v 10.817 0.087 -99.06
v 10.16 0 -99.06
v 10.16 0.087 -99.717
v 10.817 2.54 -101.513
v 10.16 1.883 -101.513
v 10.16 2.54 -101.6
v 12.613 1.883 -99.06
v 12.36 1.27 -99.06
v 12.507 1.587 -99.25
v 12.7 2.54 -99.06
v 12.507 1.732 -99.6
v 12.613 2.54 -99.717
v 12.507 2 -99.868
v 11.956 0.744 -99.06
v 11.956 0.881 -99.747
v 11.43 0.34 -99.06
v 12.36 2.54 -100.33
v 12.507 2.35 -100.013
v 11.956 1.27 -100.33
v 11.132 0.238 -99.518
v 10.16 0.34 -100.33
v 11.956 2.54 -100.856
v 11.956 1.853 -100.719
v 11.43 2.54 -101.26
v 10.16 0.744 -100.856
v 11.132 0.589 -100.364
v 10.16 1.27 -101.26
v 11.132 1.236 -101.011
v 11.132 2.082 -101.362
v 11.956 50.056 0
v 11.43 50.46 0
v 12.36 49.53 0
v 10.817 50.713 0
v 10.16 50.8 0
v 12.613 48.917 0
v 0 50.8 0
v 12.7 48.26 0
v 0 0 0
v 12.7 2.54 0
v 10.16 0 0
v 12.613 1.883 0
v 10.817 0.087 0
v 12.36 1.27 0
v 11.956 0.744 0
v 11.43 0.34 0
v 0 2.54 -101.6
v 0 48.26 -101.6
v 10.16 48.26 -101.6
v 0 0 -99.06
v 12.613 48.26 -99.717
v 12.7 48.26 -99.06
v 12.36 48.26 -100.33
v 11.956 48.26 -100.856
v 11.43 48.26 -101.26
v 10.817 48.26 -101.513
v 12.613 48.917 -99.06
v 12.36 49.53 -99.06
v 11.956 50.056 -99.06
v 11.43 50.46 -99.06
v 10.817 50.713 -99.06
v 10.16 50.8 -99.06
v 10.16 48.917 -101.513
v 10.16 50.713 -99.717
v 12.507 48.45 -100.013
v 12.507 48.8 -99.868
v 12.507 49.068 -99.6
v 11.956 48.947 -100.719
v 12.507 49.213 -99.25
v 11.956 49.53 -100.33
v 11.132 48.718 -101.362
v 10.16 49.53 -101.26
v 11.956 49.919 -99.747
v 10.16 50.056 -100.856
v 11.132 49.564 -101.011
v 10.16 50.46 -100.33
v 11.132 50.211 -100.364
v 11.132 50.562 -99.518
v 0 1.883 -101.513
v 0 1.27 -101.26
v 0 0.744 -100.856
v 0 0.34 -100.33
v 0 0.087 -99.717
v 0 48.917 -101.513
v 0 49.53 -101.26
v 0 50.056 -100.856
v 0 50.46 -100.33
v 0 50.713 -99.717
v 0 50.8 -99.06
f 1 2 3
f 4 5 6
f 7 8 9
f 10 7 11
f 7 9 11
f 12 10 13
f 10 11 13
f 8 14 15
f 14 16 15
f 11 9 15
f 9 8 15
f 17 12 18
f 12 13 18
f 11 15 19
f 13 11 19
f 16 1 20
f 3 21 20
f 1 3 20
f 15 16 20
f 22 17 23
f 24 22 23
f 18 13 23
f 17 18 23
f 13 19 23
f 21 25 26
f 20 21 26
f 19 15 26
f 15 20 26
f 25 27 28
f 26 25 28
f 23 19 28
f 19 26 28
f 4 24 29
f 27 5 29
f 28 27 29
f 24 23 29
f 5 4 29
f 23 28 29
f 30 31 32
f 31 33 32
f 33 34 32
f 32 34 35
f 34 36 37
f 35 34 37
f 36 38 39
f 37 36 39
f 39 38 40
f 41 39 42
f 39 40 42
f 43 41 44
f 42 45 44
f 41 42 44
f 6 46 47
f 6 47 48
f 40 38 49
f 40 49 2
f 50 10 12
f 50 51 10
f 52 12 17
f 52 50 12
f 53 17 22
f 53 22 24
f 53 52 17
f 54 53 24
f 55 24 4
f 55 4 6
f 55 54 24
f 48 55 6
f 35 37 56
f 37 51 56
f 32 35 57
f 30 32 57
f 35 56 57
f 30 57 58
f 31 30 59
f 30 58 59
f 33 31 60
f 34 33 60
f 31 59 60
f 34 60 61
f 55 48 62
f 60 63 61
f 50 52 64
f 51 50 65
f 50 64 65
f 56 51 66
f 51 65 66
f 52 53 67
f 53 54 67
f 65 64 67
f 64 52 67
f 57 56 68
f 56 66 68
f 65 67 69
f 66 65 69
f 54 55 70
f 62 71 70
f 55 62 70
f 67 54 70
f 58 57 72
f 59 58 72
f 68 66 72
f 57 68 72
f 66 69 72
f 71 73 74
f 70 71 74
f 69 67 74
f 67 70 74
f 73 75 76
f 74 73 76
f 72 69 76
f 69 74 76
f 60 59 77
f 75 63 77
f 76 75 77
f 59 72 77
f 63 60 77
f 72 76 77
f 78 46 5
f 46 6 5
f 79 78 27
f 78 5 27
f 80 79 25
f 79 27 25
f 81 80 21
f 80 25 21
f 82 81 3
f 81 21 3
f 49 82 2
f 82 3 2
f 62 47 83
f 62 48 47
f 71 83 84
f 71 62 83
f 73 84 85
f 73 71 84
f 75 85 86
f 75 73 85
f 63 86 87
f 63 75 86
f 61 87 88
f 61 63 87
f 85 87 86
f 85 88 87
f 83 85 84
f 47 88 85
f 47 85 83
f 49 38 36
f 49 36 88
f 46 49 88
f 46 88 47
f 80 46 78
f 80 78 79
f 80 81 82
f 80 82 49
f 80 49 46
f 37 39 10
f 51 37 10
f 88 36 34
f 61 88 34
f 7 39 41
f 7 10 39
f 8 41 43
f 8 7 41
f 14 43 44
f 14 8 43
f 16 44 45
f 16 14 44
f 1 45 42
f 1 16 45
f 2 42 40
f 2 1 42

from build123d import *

# Parameters (mm, degrees)
SKETCH2_W           = 12.7
SKETCH2_H           = 101.6
BOSS_EXTRUDE3_DEPTH = 50.8
FILLET2_R           = 2.54


with BuildPart() as part:
    # Sketch2 → Boss-Extrude3 (new body)
    with BuildSketch(Plane(origin=(0, 0, 0), x_dir=(1, 0, 0), z_dir=(0, 1, 0))):
        with Locations((6.35, 50.8)):
            Rectangle(SKETCH2_W, SKETCH2_H)
    extrude(amount=BOSS_EXTRUDE3_DEPTH)

    # Fillet2
    fillet2_edges = [part.edges().sort_by_distance(p)[0] for p in [
        (6.35, 50.8, -101.6),
        (6.35, 0, -101.6),
        (12.7, 0, -50.8),
        (12.7, 25.4, -101.6),
        (12.7, 50.8, -50.8),
    ]]
    fillet(fillet2_edges, radius=FILLET2_R)


solid = part.part
